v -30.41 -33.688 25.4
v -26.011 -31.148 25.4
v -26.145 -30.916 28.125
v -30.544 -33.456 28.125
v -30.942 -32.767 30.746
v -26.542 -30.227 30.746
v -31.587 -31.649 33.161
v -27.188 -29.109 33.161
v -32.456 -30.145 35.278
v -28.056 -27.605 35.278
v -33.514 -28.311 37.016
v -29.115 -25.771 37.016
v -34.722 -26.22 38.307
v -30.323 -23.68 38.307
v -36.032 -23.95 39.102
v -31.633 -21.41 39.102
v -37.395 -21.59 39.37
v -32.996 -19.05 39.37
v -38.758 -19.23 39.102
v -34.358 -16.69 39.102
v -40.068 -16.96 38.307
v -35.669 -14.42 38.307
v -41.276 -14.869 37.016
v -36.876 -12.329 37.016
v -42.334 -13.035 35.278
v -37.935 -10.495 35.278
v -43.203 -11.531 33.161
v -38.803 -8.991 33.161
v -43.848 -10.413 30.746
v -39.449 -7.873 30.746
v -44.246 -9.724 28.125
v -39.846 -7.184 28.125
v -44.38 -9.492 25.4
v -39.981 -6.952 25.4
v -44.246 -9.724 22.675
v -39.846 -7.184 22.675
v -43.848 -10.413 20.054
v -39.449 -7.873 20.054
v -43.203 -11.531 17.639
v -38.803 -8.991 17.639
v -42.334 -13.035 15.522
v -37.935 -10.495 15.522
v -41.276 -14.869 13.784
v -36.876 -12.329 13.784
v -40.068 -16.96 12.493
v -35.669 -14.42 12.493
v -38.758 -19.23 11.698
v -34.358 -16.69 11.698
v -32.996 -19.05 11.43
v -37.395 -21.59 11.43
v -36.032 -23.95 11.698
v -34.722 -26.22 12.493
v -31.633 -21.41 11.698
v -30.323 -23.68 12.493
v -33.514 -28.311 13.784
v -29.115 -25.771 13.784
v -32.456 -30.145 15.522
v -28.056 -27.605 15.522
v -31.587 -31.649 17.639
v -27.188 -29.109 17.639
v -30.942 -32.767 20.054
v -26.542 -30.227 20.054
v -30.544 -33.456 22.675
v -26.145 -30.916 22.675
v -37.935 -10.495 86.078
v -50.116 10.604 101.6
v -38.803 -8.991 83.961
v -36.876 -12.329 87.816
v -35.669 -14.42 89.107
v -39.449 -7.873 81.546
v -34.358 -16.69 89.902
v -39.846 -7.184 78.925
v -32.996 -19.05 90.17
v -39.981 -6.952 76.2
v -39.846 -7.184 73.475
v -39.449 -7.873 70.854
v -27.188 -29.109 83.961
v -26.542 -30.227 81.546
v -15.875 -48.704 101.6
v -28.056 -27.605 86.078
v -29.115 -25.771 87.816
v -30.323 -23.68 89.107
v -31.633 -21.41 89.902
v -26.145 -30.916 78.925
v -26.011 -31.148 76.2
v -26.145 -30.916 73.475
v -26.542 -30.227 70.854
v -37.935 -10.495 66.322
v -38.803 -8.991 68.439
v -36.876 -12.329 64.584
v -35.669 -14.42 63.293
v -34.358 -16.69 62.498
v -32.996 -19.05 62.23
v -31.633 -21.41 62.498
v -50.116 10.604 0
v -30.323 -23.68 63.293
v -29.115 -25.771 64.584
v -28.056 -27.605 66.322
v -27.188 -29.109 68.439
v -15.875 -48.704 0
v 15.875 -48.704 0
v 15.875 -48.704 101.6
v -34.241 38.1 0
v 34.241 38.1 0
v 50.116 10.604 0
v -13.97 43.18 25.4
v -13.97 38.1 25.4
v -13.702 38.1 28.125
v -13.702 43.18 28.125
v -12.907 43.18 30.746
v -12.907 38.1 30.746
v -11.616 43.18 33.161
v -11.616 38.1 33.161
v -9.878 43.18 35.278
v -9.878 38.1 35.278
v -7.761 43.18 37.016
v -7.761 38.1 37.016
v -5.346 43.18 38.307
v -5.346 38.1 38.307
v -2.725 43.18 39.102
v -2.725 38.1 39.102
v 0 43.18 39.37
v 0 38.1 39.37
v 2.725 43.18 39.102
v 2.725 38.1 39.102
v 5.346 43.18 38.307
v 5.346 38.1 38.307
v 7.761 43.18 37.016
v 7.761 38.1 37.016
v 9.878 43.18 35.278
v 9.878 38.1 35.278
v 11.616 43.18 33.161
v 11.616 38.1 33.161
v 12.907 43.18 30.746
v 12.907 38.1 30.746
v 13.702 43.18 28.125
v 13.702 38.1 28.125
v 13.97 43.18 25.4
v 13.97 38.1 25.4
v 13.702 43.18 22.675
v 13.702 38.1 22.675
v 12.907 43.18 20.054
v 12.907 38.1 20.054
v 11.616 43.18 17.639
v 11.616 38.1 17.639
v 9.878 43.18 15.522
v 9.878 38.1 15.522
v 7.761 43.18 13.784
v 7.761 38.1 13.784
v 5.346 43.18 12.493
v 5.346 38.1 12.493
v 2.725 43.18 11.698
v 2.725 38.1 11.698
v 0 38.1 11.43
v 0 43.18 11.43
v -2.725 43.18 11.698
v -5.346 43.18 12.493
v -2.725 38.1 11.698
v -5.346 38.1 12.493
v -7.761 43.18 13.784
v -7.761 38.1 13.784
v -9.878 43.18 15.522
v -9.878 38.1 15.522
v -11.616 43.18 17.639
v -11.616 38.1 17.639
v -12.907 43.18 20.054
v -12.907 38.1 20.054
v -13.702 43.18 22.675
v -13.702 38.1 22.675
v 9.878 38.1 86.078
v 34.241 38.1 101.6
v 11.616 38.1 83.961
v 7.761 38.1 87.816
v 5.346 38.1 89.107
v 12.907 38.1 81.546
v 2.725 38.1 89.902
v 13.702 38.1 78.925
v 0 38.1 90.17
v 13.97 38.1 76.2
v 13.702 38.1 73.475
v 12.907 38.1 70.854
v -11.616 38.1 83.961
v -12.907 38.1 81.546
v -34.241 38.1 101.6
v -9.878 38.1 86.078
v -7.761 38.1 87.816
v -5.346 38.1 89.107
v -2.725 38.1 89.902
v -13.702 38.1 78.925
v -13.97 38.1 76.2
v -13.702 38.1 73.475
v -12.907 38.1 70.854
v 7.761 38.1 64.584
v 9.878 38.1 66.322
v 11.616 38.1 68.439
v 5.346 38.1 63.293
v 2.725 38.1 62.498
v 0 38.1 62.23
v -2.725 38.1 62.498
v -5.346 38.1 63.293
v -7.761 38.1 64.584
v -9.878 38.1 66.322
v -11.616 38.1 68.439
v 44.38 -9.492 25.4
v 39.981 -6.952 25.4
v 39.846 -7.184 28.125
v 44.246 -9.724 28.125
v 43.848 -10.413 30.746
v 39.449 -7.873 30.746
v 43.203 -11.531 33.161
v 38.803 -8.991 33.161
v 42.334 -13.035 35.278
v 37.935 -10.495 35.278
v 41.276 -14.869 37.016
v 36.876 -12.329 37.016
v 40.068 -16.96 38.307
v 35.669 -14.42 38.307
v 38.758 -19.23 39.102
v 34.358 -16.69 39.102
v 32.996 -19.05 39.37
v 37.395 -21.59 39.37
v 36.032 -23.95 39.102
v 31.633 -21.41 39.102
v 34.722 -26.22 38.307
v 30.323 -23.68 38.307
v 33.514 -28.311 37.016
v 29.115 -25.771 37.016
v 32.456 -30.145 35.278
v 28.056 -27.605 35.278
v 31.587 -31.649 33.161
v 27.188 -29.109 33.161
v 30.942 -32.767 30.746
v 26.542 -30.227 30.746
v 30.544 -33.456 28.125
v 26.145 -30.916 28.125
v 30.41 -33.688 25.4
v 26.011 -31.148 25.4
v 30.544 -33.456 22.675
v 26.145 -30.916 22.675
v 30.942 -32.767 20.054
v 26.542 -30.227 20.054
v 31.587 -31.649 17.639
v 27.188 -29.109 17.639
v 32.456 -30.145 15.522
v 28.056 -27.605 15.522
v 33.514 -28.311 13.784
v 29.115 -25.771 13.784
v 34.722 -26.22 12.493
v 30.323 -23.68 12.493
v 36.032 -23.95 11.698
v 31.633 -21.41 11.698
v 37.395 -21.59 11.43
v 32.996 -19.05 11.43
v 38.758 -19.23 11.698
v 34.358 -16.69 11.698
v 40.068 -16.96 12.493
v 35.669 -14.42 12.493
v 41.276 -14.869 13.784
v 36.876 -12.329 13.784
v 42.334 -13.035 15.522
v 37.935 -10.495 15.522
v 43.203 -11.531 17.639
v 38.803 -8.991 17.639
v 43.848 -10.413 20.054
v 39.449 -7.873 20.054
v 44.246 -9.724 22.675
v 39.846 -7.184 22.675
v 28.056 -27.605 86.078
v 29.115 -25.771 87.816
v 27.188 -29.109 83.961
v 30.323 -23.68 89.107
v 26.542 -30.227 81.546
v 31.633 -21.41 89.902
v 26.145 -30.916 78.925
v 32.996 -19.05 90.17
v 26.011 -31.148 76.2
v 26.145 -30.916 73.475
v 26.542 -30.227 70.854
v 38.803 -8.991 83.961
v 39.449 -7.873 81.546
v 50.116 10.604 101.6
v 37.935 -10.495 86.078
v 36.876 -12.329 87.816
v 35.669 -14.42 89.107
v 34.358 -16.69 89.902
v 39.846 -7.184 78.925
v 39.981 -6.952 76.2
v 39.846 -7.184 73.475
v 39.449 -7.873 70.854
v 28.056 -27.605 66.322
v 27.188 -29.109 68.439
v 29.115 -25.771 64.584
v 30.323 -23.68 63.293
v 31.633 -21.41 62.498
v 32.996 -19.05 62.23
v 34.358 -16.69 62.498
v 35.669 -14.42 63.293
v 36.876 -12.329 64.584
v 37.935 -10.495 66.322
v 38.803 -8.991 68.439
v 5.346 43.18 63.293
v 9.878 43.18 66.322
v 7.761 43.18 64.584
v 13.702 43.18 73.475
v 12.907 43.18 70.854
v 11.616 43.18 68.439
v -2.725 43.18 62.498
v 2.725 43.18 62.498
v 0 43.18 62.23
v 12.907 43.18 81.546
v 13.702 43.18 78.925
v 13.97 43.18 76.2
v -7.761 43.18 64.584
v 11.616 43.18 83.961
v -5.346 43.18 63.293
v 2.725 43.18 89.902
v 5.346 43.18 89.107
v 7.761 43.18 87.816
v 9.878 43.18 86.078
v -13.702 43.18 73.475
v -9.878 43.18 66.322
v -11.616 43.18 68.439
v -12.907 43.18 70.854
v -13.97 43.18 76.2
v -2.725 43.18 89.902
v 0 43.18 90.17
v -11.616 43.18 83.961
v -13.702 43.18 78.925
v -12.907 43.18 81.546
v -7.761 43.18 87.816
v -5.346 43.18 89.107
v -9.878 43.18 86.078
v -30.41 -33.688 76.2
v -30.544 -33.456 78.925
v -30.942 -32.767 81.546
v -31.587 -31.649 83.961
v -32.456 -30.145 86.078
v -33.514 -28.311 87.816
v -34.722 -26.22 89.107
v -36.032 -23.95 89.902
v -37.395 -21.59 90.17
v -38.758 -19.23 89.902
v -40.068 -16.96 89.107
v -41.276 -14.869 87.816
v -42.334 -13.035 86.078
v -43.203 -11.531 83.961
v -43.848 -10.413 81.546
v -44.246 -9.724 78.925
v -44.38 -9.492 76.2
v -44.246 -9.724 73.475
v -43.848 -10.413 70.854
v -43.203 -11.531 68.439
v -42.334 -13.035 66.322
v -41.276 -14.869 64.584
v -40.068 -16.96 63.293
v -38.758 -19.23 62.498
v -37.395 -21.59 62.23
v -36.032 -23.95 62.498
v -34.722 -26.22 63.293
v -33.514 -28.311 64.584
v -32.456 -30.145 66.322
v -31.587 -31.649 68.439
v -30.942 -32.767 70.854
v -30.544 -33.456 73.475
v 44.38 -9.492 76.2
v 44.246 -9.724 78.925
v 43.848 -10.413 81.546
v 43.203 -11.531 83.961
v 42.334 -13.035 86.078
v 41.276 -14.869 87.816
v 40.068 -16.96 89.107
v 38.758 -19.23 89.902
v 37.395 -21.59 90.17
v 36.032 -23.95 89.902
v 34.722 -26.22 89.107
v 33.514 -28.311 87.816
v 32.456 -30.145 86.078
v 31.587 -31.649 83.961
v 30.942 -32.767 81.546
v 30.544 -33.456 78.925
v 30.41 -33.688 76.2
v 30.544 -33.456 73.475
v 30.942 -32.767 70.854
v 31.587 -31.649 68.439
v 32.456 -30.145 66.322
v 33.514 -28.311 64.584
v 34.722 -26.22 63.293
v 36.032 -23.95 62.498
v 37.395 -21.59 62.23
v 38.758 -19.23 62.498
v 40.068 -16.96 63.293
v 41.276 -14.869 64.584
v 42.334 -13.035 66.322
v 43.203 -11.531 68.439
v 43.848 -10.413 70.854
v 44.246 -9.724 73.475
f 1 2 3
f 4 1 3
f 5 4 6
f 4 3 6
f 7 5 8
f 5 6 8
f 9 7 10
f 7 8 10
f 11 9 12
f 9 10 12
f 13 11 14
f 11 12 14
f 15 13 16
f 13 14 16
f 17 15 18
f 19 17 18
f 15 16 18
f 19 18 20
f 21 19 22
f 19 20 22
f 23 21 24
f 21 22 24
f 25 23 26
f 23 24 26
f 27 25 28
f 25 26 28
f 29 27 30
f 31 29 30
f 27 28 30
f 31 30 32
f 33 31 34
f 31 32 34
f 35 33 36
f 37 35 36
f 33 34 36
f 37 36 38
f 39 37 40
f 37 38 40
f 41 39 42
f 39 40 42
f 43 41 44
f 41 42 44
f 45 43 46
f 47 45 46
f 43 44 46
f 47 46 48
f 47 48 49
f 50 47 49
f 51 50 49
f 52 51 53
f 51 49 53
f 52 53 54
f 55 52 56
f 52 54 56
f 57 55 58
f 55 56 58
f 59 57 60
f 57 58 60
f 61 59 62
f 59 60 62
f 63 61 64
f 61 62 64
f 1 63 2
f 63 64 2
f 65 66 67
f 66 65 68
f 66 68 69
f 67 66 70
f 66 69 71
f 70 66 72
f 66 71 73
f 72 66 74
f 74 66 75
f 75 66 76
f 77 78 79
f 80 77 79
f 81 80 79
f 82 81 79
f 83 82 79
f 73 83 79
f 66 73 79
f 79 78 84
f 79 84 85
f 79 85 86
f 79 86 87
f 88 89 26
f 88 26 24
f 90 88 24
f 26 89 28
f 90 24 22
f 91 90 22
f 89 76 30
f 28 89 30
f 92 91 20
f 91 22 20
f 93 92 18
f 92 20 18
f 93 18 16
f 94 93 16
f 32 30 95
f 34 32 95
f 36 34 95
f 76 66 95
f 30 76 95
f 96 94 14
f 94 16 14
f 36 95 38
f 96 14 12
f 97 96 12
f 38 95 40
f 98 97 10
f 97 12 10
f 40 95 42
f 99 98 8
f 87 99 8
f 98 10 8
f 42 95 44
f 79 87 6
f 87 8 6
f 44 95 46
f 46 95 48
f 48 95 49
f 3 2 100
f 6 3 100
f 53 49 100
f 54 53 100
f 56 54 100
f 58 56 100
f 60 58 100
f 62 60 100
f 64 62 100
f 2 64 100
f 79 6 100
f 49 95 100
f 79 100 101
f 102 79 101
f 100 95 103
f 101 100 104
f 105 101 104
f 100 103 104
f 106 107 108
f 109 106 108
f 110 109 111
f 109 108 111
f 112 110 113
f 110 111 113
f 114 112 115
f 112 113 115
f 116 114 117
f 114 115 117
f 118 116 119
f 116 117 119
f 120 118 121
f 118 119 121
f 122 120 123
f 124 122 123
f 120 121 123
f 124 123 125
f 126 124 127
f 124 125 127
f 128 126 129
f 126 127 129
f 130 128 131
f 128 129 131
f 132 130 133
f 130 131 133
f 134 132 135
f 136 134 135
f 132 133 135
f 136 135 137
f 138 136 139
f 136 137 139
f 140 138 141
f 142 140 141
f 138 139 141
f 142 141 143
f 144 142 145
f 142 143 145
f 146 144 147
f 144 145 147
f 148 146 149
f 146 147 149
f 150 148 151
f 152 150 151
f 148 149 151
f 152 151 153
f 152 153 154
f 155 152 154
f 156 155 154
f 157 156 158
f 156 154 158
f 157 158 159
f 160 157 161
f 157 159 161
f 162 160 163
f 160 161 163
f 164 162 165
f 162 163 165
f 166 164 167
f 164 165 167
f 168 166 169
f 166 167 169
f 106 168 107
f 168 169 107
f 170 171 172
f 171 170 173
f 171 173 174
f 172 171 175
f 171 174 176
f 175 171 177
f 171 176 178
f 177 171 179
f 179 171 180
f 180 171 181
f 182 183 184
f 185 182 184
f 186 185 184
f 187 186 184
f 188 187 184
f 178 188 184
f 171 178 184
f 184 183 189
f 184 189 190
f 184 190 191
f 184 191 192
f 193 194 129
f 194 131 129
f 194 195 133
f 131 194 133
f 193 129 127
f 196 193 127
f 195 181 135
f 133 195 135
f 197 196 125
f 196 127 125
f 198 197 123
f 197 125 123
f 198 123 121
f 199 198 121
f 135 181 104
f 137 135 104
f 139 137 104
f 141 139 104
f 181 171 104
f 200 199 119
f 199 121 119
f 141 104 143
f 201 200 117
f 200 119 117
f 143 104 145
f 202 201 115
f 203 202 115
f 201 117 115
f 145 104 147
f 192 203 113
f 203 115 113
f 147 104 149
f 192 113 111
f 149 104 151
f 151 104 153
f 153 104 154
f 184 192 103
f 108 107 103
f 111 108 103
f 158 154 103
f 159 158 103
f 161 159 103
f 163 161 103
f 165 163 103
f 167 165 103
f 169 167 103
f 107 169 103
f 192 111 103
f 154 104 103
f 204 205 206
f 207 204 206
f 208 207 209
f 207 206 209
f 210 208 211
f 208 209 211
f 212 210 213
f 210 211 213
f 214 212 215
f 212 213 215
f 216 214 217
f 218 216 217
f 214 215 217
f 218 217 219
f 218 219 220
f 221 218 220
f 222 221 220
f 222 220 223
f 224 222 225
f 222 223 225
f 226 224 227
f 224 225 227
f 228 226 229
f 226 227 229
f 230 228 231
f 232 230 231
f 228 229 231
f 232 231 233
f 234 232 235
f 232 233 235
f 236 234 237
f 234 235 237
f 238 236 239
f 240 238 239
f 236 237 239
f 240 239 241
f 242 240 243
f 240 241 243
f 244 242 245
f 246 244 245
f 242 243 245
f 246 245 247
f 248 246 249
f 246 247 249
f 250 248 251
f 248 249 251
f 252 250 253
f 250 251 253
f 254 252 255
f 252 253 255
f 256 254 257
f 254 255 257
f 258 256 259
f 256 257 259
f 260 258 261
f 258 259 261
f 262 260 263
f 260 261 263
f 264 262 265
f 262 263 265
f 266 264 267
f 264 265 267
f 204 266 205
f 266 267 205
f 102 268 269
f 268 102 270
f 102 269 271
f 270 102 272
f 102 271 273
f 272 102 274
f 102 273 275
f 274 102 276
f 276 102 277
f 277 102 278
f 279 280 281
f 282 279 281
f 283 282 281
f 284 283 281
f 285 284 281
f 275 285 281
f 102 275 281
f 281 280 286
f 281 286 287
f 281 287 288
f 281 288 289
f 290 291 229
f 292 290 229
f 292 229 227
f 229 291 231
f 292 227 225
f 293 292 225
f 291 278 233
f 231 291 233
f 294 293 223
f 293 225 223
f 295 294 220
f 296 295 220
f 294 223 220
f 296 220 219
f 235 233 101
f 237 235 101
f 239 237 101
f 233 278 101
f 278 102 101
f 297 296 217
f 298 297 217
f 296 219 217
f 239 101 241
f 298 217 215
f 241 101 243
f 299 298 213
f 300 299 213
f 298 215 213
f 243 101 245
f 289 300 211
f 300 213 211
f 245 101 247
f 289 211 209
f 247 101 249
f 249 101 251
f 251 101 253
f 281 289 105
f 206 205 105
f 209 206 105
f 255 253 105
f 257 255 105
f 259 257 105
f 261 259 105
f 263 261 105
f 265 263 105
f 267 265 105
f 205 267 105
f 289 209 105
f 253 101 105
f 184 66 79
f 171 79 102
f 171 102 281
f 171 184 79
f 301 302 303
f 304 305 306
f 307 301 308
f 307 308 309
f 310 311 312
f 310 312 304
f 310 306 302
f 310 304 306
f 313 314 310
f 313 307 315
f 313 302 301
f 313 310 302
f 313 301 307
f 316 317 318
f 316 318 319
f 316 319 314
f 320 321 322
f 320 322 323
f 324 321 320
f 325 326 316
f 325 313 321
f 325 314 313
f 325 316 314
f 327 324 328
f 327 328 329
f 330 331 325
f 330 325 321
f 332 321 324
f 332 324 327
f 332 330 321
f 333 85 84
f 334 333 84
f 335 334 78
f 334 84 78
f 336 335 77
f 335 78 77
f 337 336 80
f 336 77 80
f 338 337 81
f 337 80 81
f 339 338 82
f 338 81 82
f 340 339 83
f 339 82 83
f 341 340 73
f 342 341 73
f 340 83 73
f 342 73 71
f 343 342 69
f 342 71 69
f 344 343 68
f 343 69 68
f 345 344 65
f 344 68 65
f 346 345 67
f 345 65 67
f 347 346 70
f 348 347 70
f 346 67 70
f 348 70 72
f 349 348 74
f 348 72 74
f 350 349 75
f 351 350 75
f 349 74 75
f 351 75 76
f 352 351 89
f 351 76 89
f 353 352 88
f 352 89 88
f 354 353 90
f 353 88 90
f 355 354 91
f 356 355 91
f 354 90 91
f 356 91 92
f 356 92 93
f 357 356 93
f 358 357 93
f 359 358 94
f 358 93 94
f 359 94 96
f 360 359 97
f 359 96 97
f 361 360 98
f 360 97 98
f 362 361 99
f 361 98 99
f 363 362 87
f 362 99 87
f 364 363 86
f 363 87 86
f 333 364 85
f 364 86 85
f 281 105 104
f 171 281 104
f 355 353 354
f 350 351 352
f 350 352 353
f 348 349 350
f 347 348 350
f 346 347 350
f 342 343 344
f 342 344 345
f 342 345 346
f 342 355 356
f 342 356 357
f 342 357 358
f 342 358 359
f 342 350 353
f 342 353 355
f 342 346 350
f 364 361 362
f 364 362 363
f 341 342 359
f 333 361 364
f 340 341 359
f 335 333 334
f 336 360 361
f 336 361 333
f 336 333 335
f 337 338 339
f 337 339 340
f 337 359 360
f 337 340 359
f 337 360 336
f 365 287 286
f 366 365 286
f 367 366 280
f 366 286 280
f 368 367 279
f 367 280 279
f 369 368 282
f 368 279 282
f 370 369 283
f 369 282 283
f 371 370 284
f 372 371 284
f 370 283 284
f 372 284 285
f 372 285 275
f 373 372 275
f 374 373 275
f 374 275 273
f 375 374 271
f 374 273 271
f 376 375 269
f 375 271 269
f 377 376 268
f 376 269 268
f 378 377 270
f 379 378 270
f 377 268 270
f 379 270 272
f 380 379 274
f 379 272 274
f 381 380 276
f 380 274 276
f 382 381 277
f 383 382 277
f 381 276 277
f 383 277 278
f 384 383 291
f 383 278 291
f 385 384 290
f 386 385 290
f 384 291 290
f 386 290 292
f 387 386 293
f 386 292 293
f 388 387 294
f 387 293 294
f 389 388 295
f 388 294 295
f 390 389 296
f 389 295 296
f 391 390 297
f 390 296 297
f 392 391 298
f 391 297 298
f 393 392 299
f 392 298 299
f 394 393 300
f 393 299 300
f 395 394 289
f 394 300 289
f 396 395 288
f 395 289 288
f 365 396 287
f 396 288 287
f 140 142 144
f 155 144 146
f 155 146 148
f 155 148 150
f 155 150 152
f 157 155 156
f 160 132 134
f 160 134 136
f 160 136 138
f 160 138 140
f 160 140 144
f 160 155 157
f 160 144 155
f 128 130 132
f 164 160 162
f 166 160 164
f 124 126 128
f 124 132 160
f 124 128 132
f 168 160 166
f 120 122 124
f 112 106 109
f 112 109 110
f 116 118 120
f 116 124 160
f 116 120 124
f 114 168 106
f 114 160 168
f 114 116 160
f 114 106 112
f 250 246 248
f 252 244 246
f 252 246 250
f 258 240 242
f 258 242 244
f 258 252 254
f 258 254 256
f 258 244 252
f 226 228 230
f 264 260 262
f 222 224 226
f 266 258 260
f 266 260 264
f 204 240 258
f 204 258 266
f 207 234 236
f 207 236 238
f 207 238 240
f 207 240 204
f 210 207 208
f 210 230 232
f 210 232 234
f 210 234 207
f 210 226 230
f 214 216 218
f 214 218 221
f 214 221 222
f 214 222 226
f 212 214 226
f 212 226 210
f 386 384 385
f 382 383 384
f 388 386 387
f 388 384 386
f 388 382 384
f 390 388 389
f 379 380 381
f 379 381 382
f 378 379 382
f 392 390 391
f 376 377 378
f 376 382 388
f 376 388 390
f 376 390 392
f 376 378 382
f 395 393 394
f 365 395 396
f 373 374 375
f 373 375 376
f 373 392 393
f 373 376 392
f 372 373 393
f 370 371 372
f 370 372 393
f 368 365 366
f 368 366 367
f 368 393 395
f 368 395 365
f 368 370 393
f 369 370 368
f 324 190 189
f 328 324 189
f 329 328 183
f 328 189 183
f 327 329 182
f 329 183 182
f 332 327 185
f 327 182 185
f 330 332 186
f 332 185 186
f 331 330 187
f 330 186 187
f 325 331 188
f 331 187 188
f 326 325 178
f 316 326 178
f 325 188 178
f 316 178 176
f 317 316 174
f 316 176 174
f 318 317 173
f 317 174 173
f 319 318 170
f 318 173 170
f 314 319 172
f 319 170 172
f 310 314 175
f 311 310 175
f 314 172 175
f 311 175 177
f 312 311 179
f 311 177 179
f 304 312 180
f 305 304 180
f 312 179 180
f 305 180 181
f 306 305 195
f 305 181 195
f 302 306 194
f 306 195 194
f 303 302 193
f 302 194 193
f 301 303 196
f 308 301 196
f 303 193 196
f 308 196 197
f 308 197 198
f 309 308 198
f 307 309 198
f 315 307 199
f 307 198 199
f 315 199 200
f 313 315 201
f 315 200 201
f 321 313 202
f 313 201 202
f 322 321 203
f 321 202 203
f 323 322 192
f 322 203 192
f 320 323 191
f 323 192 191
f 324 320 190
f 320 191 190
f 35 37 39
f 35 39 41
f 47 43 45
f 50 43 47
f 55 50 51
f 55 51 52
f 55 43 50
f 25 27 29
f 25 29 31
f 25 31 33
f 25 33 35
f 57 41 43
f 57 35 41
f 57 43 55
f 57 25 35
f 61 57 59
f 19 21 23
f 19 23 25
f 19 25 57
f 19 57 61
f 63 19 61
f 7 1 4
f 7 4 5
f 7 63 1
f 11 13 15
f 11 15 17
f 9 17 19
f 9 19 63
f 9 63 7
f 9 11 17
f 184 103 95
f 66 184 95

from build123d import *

# Parameters (mm, degrees)
F1_DEPTH = 101.6
F2_R     = 13.97
F3_DEPTH = 5.08
F4_R     = 13.97
F5_DEPTH = 5.08
F6_R     = 13.97
F7_DEPTH = 5.08


with BuildPart() as f1:
    # F0 (on Top) → F1 (new body)
    with BuildSketch(Plane.XY):
        Polygon((-50.1161357684, 10.6036934298), (-15.875, -48.7036934298), (15.875, -48.7036934298), (50.1161357684, 10.6036934298), (34.2411357684, 38.1), (-34.2411357684, 38.1), align=None)
    extrude(amount=F1_DEPTH)

    # F2 (on face) → F3 (join)
    with BuildSketch(Plane(origin=(-32.9955678842, -19.05, 0), x_dir=(0.5, -0.8660254038, 0), z_dir=(-0.8660254038, -0.5, 0))):
        with Locations((0, 76.2)):
            Circle(F2_R)
        with Locations((0, 25.4)):
            Circle(F2_R)
    extrude(amount=F3_DEPTH)

    # F4 (on face) → F5 (join)
    with BuildSketch(Plane(origin=(0, 38.1, 0), x_dir=(-1, 0, 0), z_dir=(0, 1, 0))):
        with Locations((0, 76.2)):
            Circle(F4_R)
        with Locations((0, 25.4)):
            Circle(F4_R)
    extrude(amount=F5_DEPTH)

    # F6 (on face) → F7 (join)
    with BuildSketch(Plane(origin=(32.9955678842, -19.05, 0), x_dir=(0.5, 0.8660254038, 0), z_dir=(0.8660254038, -0.5, 0))):
        with Locations((0, 76.2)):
            Circle(F6_R)
        with Locations((0, 25.4)):
            Circle(F6_R)
    extrude(amount=F7_DEPTH)


solid = f1.part
